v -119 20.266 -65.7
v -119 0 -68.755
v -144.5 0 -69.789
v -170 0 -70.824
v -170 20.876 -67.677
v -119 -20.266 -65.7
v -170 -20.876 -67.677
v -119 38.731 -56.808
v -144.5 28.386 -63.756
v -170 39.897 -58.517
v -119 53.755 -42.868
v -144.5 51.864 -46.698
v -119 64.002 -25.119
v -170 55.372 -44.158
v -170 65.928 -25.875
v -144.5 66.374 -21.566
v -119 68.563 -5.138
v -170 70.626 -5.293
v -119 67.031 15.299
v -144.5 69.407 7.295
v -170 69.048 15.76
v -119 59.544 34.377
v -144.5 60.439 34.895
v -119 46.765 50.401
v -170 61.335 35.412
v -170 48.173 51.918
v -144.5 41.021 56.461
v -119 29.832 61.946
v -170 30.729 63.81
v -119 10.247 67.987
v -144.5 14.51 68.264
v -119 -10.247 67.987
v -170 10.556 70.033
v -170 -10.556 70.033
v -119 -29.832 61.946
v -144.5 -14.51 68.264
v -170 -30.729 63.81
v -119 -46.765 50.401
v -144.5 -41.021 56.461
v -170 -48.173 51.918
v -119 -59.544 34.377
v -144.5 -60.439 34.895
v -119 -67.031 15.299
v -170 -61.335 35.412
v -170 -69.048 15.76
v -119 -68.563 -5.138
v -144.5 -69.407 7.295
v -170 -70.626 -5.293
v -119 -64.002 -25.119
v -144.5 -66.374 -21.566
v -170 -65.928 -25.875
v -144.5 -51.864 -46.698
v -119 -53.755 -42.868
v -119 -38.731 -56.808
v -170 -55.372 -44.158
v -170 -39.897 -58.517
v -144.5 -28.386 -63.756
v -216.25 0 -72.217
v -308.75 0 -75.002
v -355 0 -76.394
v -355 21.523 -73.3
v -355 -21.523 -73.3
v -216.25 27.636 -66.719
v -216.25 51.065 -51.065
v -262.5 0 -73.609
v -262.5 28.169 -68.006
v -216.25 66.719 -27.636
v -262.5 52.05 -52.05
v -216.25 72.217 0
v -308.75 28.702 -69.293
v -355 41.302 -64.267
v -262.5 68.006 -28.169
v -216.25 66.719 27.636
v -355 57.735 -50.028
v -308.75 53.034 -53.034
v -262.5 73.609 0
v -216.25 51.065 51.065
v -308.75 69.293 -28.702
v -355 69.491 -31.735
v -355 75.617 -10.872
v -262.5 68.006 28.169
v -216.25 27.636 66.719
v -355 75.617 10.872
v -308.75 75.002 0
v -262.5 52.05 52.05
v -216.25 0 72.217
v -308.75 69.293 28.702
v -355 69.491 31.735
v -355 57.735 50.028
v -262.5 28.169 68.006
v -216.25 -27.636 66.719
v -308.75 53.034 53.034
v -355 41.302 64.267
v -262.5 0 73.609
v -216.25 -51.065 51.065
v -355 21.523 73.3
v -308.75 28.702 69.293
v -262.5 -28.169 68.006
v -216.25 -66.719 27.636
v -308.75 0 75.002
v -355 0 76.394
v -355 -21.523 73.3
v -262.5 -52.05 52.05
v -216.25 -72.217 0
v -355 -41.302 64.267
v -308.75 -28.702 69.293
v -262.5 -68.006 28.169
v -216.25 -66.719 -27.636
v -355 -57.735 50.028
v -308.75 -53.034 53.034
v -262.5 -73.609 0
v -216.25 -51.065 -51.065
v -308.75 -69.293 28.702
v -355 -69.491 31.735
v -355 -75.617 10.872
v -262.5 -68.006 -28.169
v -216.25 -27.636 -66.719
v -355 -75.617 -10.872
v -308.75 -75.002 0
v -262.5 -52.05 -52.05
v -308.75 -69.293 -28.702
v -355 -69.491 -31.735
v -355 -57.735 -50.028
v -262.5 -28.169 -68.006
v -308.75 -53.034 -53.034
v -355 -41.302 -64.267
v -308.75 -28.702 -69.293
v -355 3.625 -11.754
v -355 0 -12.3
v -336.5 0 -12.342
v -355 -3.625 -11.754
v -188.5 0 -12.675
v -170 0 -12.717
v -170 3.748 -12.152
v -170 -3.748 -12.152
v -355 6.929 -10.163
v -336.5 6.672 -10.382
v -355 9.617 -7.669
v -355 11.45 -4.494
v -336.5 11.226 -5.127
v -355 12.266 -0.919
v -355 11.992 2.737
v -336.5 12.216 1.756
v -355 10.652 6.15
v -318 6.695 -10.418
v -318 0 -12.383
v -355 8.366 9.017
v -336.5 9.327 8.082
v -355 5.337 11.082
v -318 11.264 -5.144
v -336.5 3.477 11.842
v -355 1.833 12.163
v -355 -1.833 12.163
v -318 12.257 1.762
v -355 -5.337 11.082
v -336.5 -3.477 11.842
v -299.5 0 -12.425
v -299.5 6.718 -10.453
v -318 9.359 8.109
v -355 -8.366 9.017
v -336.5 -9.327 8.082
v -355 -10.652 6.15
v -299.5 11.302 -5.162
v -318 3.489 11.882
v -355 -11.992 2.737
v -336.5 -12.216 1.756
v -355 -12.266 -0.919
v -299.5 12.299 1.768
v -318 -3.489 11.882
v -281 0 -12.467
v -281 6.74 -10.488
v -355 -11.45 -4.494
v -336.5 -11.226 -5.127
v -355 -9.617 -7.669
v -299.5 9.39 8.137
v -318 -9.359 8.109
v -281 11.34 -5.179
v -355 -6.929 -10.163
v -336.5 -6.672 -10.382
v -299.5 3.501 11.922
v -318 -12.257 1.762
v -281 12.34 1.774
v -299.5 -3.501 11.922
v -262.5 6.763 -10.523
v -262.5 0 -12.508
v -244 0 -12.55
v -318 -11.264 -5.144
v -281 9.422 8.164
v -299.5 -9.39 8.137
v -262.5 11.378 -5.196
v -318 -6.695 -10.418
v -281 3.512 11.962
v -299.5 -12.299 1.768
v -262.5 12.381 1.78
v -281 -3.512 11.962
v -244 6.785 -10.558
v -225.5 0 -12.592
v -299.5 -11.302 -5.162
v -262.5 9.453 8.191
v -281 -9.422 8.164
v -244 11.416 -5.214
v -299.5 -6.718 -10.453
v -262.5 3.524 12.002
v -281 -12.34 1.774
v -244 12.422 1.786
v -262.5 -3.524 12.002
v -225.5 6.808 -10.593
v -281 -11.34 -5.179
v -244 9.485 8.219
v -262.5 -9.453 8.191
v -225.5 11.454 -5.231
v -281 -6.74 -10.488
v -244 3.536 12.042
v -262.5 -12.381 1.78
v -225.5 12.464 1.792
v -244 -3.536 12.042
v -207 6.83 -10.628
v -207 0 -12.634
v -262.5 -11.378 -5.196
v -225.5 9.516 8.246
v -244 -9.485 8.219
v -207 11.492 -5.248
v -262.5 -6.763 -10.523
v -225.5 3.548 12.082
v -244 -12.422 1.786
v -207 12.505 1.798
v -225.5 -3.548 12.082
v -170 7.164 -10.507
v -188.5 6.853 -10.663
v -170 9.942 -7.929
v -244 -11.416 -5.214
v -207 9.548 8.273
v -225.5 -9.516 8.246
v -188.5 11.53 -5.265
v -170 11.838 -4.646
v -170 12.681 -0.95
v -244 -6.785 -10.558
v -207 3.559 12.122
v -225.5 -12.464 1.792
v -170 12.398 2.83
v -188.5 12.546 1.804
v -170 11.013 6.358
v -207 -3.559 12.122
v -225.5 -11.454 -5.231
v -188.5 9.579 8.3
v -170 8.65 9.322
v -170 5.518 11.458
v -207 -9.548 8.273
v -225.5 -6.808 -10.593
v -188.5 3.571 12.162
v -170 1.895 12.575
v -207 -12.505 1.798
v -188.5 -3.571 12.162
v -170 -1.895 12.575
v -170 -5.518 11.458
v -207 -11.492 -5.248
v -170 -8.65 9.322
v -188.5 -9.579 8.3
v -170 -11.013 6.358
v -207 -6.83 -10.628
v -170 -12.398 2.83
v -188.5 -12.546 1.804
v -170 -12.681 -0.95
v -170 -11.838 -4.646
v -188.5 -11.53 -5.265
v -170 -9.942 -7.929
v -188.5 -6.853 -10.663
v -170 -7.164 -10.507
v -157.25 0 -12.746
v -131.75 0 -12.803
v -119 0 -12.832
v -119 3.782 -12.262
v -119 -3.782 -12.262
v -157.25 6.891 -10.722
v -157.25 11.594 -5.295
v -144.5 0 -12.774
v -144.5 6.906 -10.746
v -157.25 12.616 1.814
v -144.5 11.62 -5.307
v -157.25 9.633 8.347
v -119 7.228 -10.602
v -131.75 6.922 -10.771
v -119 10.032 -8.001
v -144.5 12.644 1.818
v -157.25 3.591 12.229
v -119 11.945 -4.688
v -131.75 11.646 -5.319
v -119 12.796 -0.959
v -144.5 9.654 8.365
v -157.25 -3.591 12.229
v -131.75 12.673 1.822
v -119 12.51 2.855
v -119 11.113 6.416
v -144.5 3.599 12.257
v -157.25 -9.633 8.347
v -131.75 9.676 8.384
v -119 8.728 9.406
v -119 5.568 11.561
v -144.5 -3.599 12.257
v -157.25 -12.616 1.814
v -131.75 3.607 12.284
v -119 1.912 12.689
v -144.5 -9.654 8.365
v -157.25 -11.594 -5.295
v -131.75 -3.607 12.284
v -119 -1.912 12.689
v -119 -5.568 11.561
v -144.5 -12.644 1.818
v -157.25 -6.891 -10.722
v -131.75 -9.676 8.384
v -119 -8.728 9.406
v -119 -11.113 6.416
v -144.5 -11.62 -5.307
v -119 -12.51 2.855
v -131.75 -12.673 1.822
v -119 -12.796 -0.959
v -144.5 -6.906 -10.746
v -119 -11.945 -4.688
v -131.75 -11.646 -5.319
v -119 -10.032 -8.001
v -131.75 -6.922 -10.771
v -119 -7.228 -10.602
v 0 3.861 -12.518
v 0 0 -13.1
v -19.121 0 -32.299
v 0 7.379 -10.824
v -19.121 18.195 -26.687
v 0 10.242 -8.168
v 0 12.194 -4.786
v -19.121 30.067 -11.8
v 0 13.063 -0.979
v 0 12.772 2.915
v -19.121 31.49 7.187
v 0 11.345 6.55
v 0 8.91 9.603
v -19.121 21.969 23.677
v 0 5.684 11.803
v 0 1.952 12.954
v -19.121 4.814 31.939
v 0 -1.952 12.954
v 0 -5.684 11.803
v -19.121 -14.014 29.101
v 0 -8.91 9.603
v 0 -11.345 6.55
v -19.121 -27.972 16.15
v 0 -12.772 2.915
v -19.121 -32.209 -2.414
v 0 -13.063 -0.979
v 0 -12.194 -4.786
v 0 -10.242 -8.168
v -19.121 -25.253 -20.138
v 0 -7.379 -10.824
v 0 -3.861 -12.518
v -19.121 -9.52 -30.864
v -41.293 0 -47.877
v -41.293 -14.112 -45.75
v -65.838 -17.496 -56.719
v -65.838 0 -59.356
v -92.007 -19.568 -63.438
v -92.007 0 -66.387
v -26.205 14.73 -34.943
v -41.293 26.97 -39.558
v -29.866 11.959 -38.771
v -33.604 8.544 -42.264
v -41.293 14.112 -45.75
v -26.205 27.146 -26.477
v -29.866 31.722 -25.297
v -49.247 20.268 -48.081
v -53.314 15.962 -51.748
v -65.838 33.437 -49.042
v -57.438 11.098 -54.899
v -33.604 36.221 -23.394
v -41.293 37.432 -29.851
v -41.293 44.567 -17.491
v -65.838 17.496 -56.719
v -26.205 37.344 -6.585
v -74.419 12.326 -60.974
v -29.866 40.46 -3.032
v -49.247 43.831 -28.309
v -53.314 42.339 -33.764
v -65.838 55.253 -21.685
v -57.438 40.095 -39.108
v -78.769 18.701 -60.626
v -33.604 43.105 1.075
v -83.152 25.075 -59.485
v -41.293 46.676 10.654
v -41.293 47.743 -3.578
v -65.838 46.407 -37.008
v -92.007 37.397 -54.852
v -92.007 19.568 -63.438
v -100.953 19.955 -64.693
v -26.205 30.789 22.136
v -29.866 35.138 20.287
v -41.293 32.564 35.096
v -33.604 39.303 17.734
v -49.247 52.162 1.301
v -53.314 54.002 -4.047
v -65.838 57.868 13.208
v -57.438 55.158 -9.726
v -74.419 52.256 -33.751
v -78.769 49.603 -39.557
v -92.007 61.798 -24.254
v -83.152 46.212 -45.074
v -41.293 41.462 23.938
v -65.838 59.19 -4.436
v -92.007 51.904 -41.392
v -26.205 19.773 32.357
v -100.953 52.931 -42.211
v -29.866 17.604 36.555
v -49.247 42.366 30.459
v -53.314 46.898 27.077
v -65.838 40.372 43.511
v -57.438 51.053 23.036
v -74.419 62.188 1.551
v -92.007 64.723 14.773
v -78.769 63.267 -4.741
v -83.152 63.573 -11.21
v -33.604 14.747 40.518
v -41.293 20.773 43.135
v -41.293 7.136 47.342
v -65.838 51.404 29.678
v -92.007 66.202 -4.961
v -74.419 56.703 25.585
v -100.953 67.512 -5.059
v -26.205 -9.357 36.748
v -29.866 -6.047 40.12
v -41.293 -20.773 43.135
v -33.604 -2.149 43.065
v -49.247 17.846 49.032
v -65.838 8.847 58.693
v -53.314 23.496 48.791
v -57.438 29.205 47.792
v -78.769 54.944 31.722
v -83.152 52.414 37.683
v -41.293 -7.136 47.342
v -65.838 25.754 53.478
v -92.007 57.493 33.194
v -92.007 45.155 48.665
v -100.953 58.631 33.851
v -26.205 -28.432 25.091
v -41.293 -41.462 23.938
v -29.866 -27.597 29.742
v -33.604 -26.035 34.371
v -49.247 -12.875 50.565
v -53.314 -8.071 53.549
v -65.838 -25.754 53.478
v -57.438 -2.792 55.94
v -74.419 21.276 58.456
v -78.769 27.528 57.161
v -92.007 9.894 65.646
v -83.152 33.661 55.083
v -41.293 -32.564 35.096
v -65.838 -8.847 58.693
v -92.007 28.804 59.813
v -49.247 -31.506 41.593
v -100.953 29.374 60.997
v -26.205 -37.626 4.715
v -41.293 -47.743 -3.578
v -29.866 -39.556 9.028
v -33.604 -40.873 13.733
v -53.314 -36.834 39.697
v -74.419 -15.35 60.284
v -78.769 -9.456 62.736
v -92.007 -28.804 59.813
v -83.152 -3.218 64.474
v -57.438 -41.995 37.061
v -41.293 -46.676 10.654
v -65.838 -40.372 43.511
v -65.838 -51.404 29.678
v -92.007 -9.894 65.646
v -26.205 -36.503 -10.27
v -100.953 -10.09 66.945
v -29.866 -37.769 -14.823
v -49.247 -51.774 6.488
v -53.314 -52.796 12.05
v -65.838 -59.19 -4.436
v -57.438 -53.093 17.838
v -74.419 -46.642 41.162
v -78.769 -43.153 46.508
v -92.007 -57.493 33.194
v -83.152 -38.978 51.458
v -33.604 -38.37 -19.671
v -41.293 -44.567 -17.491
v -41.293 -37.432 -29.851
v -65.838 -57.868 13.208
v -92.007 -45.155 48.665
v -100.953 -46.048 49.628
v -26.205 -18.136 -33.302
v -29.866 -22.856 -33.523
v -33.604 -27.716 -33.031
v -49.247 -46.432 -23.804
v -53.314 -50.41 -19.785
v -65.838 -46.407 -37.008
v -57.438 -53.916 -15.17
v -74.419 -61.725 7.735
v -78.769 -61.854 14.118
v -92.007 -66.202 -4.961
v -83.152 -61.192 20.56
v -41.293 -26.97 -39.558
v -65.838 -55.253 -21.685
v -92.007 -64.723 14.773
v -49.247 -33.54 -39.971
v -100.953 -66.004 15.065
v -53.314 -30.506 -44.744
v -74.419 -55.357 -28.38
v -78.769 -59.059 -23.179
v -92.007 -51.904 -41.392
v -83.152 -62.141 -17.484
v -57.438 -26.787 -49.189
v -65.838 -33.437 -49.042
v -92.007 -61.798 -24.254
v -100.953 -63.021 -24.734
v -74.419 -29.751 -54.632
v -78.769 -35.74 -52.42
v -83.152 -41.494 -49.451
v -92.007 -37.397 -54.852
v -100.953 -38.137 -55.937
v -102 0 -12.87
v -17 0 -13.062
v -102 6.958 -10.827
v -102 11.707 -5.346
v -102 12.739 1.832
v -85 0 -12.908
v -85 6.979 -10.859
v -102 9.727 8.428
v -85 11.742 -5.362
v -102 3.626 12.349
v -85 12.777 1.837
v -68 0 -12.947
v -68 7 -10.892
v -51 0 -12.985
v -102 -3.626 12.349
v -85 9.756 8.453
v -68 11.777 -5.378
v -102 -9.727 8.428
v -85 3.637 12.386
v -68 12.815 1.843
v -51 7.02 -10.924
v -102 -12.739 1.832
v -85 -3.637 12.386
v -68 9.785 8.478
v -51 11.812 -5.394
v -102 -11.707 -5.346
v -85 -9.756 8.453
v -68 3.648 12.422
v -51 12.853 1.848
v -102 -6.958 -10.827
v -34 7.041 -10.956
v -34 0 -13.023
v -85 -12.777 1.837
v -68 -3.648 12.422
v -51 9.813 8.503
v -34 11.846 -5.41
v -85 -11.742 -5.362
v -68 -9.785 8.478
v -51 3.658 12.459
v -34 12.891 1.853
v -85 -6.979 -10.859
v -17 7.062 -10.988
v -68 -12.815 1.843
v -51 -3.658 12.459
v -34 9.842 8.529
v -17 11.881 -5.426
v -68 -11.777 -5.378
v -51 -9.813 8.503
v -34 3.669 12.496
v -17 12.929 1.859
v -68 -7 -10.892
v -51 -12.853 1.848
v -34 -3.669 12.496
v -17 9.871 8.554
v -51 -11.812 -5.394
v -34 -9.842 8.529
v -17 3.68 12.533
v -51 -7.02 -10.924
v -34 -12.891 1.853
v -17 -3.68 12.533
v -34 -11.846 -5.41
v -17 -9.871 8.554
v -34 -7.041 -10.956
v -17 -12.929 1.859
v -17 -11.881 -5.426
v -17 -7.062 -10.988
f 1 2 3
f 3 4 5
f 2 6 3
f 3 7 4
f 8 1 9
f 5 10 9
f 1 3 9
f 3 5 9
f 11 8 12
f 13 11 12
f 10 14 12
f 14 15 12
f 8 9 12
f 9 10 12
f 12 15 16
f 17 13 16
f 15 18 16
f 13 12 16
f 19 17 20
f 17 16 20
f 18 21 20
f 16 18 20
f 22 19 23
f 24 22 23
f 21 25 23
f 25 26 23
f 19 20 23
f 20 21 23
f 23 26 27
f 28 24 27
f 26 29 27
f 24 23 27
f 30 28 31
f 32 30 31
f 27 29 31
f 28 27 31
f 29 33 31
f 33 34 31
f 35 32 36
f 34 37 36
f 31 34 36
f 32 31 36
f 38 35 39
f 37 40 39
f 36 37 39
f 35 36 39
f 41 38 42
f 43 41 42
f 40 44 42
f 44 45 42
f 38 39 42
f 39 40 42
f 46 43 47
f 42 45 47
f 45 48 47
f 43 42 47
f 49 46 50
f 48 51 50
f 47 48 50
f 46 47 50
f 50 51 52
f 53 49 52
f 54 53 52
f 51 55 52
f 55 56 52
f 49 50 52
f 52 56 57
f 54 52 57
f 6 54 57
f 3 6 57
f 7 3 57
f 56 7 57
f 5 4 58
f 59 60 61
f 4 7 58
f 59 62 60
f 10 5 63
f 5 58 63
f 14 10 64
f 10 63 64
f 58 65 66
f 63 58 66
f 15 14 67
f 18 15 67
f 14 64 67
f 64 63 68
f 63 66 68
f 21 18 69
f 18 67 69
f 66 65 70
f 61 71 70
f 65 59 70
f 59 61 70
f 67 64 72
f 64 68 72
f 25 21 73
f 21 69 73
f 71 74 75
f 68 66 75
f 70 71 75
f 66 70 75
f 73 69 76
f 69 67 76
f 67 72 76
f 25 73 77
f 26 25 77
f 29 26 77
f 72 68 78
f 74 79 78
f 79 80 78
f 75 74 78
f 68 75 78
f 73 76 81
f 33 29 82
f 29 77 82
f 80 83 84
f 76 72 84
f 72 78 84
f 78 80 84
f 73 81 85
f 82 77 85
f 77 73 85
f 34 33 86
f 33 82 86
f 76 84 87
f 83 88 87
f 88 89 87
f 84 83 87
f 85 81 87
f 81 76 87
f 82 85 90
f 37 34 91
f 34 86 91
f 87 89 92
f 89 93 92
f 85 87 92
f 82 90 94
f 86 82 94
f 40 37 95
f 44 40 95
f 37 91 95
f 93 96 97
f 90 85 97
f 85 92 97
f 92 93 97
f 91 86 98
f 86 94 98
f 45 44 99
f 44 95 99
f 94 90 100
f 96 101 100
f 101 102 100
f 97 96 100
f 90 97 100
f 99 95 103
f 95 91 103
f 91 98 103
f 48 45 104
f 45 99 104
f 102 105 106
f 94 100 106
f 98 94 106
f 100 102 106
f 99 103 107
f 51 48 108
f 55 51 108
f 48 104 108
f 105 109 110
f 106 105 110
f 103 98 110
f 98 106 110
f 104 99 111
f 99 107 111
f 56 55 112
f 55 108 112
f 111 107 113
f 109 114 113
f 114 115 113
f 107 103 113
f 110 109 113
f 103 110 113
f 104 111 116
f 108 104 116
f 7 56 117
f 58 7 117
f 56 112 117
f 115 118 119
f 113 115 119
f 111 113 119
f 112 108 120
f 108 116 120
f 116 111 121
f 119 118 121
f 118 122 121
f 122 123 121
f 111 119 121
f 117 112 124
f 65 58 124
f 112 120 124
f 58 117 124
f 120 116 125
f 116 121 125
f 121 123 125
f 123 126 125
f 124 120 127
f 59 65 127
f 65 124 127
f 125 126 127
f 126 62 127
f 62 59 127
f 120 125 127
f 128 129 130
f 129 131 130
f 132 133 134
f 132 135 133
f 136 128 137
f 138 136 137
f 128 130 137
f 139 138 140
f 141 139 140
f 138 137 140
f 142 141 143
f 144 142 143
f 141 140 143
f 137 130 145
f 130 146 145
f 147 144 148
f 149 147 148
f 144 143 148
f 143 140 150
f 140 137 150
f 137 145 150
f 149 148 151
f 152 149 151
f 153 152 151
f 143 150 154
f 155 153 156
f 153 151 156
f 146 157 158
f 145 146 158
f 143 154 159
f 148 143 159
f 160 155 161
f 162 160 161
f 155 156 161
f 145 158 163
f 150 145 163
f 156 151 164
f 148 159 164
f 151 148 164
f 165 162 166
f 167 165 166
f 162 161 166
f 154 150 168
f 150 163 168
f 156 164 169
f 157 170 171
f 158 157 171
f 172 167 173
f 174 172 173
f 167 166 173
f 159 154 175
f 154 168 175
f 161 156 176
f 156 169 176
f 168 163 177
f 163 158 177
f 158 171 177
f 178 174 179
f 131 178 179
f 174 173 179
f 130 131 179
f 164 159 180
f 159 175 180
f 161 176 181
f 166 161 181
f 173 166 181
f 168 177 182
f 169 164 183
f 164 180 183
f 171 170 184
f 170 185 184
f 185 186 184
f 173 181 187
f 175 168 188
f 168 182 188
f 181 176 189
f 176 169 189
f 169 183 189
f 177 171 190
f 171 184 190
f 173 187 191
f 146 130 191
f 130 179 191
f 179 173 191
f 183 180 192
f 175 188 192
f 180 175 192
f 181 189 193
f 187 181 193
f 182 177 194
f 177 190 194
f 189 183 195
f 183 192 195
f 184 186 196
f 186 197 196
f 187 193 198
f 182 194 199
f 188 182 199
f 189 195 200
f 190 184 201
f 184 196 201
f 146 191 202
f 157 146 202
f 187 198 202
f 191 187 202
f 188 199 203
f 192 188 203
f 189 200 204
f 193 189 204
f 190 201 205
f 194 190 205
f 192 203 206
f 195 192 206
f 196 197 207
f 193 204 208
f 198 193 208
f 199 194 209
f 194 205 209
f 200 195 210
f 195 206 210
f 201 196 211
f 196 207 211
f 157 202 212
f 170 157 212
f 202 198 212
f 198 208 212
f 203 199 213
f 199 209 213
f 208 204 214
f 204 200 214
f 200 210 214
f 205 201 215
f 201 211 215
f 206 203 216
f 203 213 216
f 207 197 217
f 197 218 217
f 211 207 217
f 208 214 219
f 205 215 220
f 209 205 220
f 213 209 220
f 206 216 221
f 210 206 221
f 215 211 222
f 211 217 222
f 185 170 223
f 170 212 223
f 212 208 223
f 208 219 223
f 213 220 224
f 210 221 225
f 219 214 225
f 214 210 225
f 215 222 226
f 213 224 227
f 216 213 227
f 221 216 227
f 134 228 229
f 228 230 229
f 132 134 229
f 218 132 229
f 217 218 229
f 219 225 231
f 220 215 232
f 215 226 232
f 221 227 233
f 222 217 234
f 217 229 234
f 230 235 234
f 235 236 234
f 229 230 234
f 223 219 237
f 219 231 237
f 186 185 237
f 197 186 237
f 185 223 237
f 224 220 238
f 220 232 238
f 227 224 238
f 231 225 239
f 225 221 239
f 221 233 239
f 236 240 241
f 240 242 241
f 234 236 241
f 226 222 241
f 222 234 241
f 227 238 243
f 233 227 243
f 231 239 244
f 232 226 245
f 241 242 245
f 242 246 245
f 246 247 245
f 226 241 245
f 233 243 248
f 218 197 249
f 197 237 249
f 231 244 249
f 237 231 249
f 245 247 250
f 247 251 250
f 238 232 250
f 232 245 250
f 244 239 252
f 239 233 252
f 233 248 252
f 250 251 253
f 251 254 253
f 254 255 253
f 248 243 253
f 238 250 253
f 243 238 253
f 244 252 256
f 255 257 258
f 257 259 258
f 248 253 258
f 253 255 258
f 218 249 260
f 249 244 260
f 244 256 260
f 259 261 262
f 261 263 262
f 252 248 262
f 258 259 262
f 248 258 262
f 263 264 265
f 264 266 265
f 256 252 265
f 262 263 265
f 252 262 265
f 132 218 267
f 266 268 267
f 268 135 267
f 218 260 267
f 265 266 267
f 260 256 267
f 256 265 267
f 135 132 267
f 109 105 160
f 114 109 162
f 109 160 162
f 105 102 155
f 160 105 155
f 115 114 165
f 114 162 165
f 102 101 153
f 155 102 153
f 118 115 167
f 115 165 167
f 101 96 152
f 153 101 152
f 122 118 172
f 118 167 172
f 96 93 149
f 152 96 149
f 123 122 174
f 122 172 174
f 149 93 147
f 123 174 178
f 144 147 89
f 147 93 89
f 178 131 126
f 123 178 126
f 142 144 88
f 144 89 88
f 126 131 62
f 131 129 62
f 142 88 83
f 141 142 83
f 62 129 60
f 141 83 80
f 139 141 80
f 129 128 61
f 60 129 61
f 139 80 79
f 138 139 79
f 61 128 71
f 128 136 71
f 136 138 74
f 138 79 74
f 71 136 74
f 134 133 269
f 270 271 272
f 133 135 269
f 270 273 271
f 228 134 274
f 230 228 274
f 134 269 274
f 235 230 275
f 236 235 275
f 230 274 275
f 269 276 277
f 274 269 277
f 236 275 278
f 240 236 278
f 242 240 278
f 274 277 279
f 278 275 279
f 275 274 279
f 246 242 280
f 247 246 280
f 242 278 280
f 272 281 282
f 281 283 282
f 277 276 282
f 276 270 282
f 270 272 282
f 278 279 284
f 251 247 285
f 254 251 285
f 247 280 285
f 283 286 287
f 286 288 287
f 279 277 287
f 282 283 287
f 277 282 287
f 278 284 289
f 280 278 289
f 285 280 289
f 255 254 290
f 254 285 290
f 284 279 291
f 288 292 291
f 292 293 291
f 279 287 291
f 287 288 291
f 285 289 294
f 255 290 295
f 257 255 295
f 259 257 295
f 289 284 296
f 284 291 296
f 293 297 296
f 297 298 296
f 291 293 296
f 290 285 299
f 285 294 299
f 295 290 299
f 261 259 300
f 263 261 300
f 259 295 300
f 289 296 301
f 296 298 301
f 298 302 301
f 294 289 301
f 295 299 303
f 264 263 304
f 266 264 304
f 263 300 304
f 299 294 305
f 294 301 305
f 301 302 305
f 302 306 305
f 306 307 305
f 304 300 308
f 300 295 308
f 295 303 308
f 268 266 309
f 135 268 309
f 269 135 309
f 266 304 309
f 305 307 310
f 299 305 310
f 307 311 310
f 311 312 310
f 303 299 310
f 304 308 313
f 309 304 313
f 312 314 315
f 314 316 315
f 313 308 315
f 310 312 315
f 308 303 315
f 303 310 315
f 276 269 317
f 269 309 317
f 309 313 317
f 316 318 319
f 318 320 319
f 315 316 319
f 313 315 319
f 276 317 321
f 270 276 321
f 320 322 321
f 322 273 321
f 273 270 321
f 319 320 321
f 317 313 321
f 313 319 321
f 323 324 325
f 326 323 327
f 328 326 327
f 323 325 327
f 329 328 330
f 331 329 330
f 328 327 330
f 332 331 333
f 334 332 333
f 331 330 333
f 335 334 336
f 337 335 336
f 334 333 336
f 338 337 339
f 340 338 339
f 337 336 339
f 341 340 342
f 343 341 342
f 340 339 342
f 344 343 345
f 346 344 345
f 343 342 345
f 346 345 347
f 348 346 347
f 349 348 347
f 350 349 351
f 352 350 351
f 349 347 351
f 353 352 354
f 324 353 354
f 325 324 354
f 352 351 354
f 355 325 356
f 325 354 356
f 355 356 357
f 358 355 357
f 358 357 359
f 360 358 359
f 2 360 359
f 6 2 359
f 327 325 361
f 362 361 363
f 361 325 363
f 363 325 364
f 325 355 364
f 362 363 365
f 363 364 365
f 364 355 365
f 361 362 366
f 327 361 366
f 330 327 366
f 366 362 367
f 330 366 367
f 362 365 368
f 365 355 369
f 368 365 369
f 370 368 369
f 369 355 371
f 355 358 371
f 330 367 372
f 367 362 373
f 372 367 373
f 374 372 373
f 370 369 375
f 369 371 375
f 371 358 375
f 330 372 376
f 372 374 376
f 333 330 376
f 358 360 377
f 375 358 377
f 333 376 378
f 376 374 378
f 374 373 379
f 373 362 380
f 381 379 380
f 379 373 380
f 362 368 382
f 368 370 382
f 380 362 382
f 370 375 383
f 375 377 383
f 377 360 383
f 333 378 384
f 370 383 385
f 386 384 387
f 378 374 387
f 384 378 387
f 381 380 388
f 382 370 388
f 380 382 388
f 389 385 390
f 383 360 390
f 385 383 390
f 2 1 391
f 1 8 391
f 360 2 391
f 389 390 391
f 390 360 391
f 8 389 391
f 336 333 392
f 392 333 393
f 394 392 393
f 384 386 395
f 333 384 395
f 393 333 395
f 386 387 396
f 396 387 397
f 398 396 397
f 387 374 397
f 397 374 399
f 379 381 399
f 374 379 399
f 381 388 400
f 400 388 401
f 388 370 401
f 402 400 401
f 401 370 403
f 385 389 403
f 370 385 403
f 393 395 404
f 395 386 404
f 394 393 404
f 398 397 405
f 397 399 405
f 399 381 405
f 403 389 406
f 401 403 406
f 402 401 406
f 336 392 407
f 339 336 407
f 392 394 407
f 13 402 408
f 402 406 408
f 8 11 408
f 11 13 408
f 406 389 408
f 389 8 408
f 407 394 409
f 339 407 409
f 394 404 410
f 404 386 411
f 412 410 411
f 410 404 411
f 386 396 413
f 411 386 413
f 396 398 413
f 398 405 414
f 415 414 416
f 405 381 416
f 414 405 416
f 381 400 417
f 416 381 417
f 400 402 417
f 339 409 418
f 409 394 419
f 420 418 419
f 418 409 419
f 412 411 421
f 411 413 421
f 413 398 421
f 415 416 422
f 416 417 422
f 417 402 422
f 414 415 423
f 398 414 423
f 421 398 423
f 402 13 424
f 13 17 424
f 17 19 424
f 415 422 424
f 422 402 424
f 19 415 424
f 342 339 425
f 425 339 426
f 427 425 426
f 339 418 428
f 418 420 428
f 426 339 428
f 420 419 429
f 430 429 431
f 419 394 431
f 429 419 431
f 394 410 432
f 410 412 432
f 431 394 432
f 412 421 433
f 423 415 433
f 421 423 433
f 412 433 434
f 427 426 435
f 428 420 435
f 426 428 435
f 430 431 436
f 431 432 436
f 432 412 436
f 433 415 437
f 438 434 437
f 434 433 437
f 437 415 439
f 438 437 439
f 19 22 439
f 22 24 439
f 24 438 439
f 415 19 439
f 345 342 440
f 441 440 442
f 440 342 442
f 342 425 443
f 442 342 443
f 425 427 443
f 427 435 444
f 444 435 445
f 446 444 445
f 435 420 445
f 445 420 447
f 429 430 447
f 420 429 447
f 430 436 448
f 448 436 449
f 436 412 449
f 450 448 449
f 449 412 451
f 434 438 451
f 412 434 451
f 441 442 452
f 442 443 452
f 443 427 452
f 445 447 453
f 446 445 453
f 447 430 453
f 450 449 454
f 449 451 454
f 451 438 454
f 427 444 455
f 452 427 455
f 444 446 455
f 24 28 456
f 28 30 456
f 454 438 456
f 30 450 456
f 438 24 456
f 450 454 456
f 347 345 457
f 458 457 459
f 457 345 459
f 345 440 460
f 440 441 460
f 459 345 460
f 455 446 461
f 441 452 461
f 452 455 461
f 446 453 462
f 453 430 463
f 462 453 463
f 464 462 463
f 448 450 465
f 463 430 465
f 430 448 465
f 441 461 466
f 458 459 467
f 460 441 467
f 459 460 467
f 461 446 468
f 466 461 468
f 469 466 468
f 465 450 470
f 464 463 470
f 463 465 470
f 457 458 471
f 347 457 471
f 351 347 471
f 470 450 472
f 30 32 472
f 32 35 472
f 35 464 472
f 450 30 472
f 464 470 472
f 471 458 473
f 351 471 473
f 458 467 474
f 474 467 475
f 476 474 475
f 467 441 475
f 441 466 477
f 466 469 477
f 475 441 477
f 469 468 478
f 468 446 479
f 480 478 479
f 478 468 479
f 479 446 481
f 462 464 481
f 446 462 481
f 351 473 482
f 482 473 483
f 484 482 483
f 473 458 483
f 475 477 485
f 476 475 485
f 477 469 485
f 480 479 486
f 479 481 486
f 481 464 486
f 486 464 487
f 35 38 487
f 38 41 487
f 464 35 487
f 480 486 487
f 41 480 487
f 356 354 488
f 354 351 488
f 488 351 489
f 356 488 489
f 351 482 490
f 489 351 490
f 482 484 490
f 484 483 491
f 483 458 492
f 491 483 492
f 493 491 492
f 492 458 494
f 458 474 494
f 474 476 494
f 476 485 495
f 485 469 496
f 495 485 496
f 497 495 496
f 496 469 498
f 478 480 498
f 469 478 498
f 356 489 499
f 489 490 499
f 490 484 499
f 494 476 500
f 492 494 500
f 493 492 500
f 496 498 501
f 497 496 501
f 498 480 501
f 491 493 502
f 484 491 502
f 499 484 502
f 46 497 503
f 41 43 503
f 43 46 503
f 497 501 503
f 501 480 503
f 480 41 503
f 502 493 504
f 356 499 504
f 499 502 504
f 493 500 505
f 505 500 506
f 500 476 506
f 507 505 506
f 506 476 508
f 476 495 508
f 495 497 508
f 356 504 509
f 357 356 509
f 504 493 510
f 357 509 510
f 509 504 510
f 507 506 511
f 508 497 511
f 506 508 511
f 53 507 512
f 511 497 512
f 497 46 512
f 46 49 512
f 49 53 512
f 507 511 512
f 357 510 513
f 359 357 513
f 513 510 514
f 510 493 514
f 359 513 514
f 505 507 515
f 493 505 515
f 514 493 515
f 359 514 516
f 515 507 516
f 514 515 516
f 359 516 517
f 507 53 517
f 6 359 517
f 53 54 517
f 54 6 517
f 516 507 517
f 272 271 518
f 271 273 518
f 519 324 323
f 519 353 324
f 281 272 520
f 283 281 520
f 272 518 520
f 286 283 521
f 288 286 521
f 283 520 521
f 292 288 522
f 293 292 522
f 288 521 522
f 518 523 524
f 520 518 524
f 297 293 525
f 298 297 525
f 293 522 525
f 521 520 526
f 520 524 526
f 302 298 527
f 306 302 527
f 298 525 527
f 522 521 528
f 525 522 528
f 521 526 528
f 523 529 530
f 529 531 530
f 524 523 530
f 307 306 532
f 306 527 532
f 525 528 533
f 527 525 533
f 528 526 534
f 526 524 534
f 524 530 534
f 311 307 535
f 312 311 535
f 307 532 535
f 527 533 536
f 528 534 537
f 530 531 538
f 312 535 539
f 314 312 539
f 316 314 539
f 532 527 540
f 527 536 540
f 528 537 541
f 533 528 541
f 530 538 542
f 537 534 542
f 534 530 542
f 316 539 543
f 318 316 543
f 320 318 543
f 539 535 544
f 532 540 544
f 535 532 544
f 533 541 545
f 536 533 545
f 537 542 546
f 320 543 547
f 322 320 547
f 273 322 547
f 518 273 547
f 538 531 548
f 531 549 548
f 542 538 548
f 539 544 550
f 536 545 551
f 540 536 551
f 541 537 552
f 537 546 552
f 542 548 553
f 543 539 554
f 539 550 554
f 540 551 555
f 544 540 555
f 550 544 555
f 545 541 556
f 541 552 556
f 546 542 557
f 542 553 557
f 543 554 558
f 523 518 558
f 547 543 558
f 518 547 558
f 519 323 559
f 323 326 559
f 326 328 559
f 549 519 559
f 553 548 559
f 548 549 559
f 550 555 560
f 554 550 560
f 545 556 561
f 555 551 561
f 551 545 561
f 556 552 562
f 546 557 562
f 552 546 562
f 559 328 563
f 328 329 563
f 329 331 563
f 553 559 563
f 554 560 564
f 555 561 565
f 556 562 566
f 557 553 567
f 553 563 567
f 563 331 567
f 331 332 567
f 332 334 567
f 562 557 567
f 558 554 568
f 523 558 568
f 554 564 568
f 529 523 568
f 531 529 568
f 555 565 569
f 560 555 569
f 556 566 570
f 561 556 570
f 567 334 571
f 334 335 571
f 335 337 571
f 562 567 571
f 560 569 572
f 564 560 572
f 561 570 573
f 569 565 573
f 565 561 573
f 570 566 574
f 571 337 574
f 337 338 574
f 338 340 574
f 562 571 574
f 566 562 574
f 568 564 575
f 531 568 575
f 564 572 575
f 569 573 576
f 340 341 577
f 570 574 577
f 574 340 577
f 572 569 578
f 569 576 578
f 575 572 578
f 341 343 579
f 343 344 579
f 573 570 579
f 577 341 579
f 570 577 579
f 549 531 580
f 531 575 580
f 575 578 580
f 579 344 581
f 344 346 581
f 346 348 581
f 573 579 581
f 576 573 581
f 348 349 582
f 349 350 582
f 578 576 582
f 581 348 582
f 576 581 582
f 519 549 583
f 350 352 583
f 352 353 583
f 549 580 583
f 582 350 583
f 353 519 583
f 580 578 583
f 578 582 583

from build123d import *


with BuildPart() as part:
    # Sketch1 → Revolve1 (revolve)
    with BuildSketch(Plane(origin=(0, 0, 0), x_dir=(1, 0, 0), z_dir=(0, 1, 0))):
        Polygon((-355, 76.3943727), (-355, 12.3), (-170, 12.716901408), (-170, 70.8239497), align=None)
        Polygon((-170, 70.8239497), (-170, 12.716901408), (-119, 12.831830986), (-119, 68.7549354), align=None)
        with BuildLine():
            Line((-119, 68.7549354), (-119, 12.831830986))
            Line((-119, 12.831830986), (0, 13.1))
            ThreePointArc((0, 13.1), (-53.314248435, 54.153687996), (-119, 68.7549354))
        make_face()
    revolve(axis=Axis((-69.290541893, 0, 0), (1, 0, 0)))


solid = part.part
